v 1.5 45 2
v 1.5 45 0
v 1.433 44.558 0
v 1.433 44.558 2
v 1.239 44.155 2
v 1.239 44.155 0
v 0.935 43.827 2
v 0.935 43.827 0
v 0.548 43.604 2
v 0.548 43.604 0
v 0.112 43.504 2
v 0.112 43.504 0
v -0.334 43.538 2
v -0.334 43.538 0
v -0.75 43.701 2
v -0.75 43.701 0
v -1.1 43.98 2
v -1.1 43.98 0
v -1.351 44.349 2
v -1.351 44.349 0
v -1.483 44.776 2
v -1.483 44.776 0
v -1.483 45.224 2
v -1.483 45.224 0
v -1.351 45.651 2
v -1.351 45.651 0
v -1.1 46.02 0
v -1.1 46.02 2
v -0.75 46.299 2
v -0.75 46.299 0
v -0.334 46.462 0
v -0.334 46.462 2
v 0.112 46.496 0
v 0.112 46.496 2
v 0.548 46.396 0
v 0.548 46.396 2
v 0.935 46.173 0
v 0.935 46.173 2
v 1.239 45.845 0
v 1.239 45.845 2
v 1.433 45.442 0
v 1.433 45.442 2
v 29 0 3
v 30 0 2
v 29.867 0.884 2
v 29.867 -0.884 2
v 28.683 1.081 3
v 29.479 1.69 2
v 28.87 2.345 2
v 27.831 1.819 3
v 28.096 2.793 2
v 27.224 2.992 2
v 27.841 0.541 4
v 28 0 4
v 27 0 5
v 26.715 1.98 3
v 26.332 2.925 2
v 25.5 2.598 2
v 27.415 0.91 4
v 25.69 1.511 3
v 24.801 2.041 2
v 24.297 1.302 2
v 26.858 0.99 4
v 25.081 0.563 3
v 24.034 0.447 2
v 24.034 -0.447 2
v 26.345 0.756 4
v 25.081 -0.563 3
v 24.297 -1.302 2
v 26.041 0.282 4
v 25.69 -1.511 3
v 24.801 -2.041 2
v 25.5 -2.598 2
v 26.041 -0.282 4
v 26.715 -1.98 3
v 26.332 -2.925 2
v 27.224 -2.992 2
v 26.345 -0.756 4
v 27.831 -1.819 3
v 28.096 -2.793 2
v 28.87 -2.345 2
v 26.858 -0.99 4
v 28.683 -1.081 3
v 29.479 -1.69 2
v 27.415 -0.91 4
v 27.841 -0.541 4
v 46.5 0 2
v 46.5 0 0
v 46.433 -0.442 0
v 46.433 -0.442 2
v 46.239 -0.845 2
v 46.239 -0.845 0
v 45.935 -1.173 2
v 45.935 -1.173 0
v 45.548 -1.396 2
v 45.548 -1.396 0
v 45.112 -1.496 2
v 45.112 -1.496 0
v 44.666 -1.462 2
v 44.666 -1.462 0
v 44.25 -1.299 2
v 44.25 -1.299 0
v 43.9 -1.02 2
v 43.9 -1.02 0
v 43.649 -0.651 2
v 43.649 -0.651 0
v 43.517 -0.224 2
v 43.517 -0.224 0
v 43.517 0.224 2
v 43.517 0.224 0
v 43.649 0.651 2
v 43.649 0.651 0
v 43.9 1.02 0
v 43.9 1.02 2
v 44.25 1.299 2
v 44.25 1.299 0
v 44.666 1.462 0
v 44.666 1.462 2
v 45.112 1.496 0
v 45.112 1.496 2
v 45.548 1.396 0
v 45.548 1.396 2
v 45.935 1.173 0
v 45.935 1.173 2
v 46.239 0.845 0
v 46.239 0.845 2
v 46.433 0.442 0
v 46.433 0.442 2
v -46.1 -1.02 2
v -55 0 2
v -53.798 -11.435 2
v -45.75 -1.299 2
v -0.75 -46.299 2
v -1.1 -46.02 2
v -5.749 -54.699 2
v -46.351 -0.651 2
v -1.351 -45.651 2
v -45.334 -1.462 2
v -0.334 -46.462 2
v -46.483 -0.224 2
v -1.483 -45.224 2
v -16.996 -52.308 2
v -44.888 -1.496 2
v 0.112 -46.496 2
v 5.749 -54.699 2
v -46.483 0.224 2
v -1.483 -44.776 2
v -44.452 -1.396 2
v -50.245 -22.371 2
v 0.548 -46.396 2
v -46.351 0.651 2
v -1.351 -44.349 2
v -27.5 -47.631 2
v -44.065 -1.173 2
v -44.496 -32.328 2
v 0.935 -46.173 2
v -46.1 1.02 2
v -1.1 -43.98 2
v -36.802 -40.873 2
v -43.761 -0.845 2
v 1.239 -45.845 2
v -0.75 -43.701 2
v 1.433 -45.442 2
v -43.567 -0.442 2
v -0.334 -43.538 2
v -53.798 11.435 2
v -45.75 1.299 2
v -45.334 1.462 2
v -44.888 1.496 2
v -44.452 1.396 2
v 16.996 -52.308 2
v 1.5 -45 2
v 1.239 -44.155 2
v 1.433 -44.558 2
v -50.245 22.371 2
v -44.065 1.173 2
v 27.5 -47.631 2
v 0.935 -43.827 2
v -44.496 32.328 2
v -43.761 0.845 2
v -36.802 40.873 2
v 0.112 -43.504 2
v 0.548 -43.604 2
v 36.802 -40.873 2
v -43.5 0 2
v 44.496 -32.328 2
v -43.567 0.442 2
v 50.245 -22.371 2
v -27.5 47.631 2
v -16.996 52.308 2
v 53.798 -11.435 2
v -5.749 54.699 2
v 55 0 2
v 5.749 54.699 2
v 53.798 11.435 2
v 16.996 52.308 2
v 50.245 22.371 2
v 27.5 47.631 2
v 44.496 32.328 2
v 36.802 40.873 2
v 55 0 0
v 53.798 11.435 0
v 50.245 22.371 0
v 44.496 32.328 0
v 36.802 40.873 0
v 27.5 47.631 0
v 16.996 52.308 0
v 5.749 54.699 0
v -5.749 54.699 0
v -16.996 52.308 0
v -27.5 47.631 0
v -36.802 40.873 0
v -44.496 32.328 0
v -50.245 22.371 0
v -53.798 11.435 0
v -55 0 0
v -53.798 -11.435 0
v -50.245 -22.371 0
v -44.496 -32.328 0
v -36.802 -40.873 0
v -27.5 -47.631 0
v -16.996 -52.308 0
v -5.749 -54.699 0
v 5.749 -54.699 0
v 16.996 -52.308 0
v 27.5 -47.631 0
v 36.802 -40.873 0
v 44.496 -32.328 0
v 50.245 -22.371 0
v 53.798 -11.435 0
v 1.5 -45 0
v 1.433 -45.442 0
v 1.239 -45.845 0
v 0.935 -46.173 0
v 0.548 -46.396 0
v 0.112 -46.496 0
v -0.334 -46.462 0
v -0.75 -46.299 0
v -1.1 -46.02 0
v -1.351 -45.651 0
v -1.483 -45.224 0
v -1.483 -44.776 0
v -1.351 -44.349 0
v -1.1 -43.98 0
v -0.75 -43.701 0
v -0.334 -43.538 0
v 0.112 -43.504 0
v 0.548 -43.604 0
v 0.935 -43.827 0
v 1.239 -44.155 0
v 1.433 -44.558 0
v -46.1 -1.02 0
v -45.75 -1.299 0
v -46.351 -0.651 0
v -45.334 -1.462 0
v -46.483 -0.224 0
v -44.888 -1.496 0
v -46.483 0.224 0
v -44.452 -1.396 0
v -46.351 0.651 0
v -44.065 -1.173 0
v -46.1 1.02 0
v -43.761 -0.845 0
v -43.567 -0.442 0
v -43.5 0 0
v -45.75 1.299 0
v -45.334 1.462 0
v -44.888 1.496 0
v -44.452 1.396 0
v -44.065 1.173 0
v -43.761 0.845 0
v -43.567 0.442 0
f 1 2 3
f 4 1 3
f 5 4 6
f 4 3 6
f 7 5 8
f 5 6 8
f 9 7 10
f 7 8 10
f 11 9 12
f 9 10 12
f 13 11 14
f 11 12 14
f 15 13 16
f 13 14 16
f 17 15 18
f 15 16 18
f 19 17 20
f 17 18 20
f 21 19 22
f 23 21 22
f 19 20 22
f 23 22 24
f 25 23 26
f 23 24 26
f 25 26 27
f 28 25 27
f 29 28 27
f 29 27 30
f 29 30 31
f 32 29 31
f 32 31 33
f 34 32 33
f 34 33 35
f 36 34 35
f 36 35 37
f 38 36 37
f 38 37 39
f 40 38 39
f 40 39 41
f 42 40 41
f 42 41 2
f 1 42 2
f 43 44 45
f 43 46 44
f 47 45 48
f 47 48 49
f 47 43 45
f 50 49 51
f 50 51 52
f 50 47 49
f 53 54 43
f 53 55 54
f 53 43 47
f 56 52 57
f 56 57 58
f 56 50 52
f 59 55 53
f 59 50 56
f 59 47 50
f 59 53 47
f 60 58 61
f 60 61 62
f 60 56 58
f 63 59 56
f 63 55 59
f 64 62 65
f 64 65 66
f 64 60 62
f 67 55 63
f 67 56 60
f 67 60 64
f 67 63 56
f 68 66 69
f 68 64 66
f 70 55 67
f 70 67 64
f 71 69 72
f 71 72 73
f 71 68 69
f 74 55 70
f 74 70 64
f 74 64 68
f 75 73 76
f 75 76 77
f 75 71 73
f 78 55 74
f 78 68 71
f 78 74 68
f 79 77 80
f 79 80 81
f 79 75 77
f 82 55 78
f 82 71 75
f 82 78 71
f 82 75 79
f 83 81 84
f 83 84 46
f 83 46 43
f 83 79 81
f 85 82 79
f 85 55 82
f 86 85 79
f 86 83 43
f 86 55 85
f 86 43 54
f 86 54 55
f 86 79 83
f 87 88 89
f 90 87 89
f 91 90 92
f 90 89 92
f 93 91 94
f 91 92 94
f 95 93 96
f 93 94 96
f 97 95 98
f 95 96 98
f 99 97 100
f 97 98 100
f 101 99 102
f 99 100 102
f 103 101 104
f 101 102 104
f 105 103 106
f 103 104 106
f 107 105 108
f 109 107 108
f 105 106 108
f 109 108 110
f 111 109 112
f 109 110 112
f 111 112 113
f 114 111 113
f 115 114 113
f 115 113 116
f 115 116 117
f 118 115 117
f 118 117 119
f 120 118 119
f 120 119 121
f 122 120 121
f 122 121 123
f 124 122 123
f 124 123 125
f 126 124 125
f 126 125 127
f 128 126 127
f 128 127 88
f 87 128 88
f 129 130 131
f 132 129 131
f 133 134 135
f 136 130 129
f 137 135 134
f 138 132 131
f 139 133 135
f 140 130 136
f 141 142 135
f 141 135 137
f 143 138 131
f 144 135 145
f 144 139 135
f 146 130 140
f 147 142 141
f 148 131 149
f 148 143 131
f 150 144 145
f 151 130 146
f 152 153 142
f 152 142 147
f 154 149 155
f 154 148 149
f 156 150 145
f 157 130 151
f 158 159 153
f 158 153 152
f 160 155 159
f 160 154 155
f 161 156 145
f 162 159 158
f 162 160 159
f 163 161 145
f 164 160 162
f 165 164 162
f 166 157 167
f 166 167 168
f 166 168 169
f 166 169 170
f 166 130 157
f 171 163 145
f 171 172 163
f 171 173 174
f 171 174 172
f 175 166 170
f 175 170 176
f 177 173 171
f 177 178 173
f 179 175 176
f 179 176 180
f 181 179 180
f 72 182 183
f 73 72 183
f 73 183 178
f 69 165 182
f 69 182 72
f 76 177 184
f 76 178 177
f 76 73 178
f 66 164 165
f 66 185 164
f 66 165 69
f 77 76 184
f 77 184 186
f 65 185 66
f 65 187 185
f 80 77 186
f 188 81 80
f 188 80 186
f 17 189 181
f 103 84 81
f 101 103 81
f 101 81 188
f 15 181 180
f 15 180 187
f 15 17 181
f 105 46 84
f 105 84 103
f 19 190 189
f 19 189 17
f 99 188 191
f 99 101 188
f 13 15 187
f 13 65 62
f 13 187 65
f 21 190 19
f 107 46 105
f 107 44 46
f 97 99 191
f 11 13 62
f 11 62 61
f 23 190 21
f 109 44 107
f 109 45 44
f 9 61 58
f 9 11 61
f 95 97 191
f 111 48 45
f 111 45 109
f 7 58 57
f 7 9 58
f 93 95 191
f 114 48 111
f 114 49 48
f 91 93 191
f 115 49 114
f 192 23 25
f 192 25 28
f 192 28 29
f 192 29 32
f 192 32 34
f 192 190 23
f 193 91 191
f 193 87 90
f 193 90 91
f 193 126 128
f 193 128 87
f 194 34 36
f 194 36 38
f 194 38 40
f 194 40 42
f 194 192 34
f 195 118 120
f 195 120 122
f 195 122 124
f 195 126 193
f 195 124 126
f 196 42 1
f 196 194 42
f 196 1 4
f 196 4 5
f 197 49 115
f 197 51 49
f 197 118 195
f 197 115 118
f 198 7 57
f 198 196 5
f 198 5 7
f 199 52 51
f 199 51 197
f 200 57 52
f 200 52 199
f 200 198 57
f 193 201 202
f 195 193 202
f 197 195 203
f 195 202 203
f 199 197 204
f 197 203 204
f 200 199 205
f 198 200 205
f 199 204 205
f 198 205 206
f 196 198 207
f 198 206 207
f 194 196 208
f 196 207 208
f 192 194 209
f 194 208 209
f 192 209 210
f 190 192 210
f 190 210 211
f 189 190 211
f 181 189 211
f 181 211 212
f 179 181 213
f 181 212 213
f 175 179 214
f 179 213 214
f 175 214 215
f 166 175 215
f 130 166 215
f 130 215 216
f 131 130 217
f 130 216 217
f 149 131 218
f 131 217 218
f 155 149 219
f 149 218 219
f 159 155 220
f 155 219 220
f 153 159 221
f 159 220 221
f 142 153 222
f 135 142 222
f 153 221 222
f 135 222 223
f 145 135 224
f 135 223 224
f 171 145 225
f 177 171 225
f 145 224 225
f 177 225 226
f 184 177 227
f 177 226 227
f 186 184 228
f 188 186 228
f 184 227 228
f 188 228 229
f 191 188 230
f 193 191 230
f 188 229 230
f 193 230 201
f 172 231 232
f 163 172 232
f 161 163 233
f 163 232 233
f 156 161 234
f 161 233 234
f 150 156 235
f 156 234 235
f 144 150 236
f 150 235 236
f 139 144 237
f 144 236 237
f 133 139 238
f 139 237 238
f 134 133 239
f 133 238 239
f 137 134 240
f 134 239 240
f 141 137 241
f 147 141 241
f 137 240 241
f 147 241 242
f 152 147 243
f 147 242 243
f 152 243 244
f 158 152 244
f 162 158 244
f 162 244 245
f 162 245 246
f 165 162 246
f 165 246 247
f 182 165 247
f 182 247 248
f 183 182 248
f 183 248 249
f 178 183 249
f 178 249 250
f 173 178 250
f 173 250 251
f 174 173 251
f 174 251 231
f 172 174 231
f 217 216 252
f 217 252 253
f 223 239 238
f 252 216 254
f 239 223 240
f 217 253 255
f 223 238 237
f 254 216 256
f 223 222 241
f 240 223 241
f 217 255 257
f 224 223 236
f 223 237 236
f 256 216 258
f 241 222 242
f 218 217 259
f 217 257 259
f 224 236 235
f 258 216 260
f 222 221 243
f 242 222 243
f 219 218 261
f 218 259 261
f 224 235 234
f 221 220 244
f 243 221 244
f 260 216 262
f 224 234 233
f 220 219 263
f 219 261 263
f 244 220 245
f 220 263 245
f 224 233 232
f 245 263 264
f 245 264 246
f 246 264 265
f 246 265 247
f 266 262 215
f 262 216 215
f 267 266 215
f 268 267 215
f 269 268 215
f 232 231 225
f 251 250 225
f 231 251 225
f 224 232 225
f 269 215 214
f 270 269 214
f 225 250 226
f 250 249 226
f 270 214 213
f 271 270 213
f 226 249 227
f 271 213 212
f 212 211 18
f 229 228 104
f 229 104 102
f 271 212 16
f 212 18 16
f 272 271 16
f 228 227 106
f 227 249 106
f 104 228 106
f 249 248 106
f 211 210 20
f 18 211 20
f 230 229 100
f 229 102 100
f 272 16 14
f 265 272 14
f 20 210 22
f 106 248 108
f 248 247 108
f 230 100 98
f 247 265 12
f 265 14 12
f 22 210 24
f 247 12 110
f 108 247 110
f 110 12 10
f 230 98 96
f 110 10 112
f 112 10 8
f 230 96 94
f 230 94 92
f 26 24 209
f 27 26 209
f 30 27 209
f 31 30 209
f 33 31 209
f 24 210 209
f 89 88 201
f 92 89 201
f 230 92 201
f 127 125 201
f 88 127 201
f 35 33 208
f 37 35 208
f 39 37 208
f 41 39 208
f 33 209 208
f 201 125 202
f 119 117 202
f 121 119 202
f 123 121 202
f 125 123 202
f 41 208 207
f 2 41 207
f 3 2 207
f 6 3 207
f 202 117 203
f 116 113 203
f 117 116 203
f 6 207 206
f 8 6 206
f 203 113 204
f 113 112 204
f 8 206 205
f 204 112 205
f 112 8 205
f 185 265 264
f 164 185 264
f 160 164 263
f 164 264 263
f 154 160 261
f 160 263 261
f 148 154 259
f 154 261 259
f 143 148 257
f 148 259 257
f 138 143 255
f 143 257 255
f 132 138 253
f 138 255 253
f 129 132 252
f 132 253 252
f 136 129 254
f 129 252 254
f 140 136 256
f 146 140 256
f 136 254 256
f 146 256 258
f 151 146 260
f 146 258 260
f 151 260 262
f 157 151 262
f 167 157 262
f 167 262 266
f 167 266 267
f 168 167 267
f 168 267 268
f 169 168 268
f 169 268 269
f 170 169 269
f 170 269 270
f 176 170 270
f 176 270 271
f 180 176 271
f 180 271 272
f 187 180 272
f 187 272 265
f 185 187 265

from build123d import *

# Parameters (mm, degrees)
F0_R     = 55
F1_DEPTH = 2
F2_R     = 1.5
F3_DEPTH = 25
F4_R     = 5
F5_DEPTH = 3


# Not quite as in the source:
# - a fillet or chamfer that OpenCascade refuses, or shapes differently, is made with other operations: its cross-section is extruded or revolved along the edge and cut away or added
# - a feature names something its author has since deleted; it is built from what else it names


with BuildPart() as f1:
    # F0 (on Top) → F1 (new body)
    with BuildSketch(Plane.XY):
        Circle(F0_R)
    extrude(amount=F1_DEPTH)

    # F2 (on face) → F3 (cut)
    with BuildSketch(Plane(origin=(0, 0, 0), x_dir=(1, 0, 0), z_dir=(0, 0, -1))):
        with Locations((-45, 0)):
            Circle(F2_R)
        with Locations((0, 45)):
            Circle(F2_R)
        with Locations((45, 0)):
            Circle(F2_R)
        with Locations((0, -45)):
            Circle(F2_R)
    extrude(amount=-F3_DEPTH, mode=Mode.SUBTRACT)

    # F4 (on face) → F5 (join)
    with BuildSketch(Plane.XY.offset(2)):
        with Locations((27, 0)):
            Circle(F4_R)
    extrude(amount=F5_DEPTH)

    # F6: chamfer of 5 on 1 edges, made by hand


with BuildPart() as f6_tool2:
    # F6_s3 → F6_t4 (revolve)
    with BuildSketch(Plane.XZ):
        Polygon((32, 0), (27, 5), (32, 5), align=None)
    revolve(axis=Axis((27, 0, 5), (0, 0, 1)))

    split(bisect_by=Plane.XY.offset(2), keep=Keep.TOP)


with BuildPart() as f1_1:
    add(f1.part)

    # F6_t1: cut F6_tool2
    add(f6_tool2.part, mode=Mode.SUBTRACT)


solid = f1_1.part
